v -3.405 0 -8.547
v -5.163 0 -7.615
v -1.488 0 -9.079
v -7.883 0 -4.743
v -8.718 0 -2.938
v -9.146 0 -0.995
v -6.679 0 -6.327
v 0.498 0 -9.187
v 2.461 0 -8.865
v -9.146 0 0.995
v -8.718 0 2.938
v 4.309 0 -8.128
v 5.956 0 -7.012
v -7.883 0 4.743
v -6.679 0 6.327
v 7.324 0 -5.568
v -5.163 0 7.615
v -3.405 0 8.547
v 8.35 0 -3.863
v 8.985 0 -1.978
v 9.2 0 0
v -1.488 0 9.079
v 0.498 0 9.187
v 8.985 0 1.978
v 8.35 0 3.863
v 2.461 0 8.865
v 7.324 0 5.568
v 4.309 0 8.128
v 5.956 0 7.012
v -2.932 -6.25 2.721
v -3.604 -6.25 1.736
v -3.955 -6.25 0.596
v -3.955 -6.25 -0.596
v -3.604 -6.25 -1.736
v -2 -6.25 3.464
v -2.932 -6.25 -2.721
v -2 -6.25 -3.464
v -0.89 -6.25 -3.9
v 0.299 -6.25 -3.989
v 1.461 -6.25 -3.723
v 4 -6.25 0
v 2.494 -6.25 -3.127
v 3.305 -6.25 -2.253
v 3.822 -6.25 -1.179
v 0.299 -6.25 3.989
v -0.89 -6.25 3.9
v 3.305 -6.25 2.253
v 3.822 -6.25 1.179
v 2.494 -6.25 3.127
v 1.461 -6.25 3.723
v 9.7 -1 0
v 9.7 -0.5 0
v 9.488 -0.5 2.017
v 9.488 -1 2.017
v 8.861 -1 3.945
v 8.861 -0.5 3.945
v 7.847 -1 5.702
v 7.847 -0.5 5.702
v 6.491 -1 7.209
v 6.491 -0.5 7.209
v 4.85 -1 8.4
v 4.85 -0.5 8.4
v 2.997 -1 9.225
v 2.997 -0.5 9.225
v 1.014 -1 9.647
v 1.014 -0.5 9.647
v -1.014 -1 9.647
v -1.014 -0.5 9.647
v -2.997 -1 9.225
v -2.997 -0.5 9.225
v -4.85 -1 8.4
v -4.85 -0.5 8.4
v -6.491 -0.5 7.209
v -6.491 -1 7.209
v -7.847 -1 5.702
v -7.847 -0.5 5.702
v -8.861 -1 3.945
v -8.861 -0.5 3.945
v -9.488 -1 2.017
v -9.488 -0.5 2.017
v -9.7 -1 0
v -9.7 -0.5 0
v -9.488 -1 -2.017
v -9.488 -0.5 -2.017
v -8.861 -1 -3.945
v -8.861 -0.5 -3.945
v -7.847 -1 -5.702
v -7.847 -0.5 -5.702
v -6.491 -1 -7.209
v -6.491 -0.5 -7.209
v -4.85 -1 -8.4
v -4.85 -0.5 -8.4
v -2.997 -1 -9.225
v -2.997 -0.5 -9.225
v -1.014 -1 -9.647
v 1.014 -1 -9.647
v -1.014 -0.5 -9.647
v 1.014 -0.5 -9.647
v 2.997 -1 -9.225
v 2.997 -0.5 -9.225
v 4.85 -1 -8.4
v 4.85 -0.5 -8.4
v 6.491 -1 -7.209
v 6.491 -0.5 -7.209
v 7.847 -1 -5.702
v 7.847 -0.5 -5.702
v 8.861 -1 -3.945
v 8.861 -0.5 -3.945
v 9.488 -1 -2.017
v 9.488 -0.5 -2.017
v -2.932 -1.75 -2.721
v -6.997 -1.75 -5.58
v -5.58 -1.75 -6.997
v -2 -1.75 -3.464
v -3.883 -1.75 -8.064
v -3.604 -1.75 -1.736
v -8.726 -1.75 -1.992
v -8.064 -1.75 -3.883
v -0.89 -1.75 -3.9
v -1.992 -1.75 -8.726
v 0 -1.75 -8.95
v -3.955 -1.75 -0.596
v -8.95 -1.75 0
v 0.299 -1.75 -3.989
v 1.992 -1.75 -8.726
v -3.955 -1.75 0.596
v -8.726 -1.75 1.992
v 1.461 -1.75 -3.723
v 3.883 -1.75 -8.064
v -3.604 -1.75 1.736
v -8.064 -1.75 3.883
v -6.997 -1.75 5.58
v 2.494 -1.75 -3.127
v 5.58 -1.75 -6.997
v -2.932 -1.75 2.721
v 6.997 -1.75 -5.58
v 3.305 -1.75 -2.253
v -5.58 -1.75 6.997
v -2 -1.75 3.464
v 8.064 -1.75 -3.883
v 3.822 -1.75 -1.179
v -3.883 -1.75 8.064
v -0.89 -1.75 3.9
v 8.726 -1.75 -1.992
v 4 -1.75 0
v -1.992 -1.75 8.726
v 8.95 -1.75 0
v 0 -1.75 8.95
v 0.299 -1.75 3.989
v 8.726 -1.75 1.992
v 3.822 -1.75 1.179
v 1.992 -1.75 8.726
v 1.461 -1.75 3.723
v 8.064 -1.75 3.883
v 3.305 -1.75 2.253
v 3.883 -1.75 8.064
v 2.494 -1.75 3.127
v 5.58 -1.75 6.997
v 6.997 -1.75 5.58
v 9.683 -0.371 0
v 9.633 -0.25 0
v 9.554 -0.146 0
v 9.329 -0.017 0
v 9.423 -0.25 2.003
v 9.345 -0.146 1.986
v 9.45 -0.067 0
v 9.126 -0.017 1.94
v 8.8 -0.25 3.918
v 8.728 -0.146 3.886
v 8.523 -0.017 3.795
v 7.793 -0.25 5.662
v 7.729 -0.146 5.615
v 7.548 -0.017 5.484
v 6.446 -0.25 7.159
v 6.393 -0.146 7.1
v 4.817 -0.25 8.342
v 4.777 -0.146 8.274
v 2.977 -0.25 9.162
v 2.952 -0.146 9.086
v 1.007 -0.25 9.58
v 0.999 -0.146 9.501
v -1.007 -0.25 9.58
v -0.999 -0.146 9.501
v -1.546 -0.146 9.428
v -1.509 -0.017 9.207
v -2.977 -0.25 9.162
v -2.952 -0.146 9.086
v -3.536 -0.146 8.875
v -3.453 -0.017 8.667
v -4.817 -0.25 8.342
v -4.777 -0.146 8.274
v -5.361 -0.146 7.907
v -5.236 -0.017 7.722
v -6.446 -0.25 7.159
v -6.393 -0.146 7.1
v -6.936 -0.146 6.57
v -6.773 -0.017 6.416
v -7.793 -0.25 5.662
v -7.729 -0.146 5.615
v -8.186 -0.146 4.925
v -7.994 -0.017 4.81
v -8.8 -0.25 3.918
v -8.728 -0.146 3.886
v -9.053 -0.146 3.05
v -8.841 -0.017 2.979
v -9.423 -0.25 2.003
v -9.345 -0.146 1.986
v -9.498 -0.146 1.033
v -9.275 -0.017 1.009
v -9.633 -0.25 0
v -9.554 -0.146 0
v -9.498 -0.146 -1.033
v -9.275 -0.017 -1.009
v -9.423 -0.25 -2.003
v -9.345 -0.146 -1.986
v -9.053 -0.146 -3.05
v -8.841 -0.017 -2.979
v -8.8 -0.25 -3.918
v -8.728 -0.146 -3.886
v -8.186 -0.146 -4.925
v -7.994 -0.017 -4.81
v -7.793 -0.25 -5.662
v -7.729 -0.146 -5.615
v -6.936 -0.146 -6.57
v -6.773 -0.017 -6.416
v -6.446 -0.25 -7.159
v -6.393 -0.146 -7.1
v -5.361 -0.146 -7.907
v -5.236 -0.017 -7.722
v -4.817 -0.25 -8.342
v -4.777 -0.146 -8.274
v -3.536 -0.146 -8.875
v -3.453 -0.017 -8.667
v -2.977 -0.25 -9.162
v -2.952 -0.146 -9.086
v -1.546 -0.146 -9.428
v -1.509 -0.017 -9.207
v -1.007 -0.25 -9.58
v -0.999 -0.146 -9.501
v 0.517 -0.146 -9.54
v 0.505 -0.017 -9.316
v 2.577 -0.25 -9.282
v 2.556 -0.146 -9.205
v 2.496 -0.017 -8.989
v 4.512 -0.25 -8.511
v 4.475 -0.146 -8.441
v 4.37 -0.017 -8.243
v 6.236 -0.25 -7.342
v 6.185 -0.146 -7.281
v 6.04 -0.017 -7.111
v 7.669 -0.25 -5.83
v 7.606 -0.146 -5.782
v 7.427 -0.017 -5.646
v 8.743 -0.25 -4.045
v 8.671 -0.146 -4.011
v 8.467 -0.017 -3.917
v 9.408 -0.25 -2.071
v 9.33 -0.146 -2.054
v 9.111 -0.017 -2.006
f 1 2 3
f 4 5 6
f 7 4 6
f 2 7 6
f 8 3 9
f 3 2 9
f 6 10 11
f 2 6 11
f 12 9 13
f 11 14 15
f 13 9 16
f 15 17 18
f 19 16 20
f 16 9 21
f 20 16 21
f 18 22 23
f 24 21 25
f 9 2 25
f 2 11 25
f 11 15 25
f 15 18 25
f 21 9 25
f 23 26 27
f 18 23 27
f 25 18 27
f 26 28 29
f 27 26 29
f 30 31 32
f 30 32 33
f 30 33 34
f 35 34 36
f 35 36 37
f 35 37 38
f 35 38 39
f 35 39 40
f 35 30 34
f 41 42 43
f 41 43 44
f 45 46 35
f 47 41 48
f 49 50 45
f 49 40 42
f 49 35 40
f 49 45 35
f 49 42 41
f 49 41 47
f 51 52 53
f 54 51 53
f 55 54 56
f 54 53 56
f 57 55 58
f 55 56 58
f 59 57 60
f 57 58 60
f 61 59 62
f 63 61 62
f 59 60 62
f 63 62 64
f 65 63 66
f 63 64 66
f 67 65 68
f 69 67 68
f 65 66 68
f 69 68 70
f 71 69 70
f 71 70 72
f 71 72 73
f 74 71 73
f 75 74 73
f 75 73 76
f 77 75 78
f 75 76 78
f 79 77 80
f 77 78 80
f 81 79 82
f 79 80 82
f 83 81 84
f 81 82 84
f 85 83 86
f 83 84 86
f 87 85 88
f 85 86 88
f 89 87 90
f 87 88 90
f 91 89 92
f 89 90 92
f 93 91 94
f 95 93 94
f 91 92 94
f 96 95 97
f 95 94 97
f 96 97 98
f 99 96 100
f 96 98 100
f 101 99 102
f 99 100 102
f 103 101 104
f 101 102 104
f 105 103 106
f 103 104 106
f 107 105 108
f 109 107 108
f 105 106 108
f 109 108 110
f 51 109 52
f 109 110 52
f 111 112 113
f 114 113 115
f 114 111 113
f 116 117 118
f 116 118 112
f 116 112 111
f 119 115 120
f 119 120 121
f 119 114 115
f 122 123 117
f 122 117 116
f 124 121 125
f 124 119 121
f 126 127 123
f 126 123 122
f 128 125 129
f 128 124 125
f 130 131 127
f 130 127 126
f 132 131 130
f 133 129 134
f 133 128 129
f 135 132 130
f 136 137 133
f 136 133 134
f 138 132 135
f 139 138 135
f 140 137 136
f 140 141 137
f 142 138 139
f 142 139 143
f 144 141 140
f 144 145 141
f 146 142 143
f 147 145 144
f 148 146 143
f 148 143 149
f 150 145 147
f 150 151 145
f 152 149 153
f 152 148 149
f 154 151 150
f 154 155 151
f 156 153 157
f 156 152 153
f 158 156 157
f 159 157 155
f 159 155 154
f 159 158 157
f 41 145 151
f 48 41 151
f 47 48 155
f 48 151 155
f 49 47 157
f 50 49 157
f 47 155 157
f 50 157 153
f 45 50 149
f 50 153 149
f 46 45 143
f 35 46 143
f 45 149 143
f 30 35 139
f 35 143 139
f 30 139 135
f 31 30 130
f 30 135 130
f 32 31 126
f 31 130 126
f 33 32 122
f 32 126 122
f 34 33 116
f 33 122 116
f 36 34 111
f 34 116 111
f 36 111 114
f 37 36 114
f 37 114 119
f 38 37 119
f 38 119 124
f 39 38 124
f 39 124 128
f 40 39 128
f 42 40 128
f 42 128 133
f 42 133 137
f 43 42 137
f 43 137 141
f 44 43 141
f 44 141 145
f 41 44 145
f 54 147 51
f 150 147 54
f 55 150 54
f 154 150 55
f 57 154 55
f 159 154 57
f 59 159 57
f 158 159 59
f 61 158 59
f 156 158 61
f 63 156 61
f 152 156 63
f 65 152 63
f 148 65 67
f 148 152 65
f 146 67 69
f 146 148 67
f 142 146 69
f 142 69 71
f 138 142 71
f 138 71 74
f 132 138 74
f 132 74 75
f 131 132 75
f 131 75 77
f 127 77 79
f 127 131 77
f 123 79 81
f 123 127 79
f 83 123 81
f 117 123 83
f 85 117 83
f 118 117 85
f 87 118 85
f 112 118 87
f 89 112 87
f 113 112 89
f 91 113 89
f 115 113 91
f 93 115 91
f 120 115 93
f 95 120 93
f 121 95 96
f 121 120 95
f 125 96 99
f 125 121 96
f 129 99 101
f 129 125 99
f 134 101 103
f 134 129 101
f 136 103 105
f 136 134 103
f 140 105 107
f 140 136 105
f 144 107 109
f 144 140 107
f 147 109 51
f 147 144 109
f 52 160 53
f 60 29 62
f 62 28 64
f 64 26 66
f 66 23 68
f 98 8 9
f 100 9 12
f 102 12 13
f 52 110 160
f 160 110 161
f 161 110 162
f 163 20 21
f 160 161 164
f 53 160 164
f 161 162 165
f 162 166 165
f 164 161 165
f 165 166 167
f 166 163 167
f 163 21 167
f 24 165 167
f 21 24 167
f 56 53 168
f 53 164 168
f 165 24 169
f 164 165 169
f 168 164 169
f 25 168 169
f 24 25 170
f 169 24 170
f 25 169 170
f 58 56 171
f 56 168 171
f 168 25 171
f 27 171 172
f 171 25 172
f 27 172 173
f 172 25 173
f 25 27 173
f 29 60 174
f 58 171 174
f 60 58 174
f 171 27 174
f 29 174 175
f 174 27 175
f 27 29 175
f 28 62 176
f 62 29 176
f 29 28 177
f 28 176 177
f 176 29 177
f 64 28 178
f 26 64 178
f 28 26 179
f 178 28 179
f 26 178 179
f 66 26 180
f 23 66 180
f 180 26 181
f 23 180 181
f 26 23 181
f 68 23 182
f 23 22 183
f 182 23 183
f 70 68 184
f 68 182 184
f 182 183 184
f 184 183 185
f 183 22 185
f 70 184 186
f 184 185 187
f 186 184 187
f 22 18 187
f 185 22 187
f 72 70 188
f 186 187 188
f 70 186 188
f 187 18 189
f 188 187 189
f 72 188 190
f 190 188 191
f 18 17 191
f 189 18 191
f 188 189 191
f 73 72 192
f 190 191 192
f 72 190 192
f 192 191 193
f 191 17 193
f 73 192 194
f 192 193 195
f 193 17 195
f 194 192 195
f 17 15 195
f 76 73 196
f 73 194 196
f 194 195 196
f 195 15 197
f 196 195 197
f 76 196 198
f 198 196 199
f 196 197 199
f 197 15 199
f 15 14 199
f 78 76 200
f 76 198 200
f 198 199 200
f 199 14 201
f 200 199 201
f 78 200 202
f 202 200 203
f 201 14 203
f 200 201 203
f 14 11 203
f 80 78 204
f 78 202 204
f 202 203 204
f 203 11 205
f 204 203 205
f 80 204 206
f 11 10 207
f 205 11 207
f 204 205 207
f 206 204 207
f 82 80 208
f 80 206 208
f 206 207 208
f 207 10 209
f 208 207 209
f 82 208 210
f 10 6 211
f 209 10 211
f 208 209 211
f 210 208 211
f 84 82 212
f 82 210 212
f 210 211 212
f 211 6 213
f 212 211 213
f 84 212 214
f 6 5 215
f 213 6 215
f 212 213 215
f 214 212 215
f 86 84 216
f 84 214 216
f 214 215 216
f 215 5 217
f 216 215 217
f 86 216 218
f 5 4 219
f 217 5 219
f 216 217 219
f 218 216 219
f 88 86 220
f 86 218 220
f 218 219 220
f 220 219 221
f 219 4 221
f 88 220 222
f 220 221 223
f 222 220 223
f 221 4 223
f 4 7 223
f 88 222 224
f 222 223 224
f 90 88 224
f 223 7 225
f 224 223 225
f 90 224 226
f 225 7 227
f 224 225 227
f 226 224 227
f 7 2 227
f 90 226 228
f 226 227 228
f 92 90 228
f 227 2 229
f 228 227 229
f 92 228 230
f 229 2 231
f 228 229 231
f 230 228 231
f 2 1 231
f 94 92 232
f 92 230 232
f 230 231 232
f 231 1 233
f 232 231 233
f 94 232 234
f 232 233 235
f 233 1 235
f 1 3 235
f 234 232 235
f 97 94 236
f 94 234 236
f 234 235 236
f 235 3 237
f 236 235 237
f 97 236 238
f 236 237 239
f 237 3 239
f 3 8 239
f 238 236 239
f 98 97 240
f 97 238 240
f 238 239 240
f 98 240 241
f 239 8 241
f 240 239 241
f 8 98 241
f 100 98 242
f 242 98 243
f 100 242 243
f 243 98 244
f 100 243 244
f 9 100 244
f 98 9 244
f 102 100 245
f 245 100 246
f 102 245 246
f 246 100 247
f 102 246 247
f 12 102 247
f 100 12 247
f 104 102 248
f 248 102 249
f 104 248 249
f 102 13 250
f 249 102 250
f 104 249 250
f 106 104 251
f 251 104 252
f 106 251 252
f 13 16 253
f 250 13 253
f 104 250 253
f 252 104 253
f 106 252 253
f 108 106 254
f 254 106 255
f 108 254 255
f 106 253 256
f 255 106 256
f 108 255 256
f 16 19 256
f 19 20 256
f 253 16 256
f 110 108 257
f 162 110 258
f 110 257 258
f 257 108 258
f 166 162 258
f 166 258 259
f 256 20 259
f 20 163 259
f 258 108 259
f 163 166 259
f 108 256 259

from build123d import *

# Parameters (mm, degrees)
F0_R     = 4
F1_DEPTH = 6.25
F0_R_2   = 9.7
F2_DEPTH = 1.75
F3_SIZE  = 0.75
F4_R     = 0.5


with BuildPart() as f1:
    # F0 (on Front) → F1 (new body)
    with BuildSketch(Plane.XZ):
        Circle(F0_R)
    extrude(amount=F1_DEPTH)

    # F0 (on Front) → F2 (join)
    with BuildSketch(Plane.XZ):
        Circle(F0_R_2)
        Circle(F0_R, mode=Mode.SUBTRACT)
    extrude(amount=F2_DEPTH)

    # F3
    f3_edges = [f1.edges().sort_by_distance(p)[0] for p in [
        (-9.7, -1.75, 0),
    ]]
    chamfer(f3_edges, length=F3_SIZE)

    # F4
    f4_edges = [f1.edges().sort_by_distance(p)[0] for p in [
        (-9.7, 0, 0),
    ]]
    fillet(f4_edges, radius=F4_R)


solid = f1.part
